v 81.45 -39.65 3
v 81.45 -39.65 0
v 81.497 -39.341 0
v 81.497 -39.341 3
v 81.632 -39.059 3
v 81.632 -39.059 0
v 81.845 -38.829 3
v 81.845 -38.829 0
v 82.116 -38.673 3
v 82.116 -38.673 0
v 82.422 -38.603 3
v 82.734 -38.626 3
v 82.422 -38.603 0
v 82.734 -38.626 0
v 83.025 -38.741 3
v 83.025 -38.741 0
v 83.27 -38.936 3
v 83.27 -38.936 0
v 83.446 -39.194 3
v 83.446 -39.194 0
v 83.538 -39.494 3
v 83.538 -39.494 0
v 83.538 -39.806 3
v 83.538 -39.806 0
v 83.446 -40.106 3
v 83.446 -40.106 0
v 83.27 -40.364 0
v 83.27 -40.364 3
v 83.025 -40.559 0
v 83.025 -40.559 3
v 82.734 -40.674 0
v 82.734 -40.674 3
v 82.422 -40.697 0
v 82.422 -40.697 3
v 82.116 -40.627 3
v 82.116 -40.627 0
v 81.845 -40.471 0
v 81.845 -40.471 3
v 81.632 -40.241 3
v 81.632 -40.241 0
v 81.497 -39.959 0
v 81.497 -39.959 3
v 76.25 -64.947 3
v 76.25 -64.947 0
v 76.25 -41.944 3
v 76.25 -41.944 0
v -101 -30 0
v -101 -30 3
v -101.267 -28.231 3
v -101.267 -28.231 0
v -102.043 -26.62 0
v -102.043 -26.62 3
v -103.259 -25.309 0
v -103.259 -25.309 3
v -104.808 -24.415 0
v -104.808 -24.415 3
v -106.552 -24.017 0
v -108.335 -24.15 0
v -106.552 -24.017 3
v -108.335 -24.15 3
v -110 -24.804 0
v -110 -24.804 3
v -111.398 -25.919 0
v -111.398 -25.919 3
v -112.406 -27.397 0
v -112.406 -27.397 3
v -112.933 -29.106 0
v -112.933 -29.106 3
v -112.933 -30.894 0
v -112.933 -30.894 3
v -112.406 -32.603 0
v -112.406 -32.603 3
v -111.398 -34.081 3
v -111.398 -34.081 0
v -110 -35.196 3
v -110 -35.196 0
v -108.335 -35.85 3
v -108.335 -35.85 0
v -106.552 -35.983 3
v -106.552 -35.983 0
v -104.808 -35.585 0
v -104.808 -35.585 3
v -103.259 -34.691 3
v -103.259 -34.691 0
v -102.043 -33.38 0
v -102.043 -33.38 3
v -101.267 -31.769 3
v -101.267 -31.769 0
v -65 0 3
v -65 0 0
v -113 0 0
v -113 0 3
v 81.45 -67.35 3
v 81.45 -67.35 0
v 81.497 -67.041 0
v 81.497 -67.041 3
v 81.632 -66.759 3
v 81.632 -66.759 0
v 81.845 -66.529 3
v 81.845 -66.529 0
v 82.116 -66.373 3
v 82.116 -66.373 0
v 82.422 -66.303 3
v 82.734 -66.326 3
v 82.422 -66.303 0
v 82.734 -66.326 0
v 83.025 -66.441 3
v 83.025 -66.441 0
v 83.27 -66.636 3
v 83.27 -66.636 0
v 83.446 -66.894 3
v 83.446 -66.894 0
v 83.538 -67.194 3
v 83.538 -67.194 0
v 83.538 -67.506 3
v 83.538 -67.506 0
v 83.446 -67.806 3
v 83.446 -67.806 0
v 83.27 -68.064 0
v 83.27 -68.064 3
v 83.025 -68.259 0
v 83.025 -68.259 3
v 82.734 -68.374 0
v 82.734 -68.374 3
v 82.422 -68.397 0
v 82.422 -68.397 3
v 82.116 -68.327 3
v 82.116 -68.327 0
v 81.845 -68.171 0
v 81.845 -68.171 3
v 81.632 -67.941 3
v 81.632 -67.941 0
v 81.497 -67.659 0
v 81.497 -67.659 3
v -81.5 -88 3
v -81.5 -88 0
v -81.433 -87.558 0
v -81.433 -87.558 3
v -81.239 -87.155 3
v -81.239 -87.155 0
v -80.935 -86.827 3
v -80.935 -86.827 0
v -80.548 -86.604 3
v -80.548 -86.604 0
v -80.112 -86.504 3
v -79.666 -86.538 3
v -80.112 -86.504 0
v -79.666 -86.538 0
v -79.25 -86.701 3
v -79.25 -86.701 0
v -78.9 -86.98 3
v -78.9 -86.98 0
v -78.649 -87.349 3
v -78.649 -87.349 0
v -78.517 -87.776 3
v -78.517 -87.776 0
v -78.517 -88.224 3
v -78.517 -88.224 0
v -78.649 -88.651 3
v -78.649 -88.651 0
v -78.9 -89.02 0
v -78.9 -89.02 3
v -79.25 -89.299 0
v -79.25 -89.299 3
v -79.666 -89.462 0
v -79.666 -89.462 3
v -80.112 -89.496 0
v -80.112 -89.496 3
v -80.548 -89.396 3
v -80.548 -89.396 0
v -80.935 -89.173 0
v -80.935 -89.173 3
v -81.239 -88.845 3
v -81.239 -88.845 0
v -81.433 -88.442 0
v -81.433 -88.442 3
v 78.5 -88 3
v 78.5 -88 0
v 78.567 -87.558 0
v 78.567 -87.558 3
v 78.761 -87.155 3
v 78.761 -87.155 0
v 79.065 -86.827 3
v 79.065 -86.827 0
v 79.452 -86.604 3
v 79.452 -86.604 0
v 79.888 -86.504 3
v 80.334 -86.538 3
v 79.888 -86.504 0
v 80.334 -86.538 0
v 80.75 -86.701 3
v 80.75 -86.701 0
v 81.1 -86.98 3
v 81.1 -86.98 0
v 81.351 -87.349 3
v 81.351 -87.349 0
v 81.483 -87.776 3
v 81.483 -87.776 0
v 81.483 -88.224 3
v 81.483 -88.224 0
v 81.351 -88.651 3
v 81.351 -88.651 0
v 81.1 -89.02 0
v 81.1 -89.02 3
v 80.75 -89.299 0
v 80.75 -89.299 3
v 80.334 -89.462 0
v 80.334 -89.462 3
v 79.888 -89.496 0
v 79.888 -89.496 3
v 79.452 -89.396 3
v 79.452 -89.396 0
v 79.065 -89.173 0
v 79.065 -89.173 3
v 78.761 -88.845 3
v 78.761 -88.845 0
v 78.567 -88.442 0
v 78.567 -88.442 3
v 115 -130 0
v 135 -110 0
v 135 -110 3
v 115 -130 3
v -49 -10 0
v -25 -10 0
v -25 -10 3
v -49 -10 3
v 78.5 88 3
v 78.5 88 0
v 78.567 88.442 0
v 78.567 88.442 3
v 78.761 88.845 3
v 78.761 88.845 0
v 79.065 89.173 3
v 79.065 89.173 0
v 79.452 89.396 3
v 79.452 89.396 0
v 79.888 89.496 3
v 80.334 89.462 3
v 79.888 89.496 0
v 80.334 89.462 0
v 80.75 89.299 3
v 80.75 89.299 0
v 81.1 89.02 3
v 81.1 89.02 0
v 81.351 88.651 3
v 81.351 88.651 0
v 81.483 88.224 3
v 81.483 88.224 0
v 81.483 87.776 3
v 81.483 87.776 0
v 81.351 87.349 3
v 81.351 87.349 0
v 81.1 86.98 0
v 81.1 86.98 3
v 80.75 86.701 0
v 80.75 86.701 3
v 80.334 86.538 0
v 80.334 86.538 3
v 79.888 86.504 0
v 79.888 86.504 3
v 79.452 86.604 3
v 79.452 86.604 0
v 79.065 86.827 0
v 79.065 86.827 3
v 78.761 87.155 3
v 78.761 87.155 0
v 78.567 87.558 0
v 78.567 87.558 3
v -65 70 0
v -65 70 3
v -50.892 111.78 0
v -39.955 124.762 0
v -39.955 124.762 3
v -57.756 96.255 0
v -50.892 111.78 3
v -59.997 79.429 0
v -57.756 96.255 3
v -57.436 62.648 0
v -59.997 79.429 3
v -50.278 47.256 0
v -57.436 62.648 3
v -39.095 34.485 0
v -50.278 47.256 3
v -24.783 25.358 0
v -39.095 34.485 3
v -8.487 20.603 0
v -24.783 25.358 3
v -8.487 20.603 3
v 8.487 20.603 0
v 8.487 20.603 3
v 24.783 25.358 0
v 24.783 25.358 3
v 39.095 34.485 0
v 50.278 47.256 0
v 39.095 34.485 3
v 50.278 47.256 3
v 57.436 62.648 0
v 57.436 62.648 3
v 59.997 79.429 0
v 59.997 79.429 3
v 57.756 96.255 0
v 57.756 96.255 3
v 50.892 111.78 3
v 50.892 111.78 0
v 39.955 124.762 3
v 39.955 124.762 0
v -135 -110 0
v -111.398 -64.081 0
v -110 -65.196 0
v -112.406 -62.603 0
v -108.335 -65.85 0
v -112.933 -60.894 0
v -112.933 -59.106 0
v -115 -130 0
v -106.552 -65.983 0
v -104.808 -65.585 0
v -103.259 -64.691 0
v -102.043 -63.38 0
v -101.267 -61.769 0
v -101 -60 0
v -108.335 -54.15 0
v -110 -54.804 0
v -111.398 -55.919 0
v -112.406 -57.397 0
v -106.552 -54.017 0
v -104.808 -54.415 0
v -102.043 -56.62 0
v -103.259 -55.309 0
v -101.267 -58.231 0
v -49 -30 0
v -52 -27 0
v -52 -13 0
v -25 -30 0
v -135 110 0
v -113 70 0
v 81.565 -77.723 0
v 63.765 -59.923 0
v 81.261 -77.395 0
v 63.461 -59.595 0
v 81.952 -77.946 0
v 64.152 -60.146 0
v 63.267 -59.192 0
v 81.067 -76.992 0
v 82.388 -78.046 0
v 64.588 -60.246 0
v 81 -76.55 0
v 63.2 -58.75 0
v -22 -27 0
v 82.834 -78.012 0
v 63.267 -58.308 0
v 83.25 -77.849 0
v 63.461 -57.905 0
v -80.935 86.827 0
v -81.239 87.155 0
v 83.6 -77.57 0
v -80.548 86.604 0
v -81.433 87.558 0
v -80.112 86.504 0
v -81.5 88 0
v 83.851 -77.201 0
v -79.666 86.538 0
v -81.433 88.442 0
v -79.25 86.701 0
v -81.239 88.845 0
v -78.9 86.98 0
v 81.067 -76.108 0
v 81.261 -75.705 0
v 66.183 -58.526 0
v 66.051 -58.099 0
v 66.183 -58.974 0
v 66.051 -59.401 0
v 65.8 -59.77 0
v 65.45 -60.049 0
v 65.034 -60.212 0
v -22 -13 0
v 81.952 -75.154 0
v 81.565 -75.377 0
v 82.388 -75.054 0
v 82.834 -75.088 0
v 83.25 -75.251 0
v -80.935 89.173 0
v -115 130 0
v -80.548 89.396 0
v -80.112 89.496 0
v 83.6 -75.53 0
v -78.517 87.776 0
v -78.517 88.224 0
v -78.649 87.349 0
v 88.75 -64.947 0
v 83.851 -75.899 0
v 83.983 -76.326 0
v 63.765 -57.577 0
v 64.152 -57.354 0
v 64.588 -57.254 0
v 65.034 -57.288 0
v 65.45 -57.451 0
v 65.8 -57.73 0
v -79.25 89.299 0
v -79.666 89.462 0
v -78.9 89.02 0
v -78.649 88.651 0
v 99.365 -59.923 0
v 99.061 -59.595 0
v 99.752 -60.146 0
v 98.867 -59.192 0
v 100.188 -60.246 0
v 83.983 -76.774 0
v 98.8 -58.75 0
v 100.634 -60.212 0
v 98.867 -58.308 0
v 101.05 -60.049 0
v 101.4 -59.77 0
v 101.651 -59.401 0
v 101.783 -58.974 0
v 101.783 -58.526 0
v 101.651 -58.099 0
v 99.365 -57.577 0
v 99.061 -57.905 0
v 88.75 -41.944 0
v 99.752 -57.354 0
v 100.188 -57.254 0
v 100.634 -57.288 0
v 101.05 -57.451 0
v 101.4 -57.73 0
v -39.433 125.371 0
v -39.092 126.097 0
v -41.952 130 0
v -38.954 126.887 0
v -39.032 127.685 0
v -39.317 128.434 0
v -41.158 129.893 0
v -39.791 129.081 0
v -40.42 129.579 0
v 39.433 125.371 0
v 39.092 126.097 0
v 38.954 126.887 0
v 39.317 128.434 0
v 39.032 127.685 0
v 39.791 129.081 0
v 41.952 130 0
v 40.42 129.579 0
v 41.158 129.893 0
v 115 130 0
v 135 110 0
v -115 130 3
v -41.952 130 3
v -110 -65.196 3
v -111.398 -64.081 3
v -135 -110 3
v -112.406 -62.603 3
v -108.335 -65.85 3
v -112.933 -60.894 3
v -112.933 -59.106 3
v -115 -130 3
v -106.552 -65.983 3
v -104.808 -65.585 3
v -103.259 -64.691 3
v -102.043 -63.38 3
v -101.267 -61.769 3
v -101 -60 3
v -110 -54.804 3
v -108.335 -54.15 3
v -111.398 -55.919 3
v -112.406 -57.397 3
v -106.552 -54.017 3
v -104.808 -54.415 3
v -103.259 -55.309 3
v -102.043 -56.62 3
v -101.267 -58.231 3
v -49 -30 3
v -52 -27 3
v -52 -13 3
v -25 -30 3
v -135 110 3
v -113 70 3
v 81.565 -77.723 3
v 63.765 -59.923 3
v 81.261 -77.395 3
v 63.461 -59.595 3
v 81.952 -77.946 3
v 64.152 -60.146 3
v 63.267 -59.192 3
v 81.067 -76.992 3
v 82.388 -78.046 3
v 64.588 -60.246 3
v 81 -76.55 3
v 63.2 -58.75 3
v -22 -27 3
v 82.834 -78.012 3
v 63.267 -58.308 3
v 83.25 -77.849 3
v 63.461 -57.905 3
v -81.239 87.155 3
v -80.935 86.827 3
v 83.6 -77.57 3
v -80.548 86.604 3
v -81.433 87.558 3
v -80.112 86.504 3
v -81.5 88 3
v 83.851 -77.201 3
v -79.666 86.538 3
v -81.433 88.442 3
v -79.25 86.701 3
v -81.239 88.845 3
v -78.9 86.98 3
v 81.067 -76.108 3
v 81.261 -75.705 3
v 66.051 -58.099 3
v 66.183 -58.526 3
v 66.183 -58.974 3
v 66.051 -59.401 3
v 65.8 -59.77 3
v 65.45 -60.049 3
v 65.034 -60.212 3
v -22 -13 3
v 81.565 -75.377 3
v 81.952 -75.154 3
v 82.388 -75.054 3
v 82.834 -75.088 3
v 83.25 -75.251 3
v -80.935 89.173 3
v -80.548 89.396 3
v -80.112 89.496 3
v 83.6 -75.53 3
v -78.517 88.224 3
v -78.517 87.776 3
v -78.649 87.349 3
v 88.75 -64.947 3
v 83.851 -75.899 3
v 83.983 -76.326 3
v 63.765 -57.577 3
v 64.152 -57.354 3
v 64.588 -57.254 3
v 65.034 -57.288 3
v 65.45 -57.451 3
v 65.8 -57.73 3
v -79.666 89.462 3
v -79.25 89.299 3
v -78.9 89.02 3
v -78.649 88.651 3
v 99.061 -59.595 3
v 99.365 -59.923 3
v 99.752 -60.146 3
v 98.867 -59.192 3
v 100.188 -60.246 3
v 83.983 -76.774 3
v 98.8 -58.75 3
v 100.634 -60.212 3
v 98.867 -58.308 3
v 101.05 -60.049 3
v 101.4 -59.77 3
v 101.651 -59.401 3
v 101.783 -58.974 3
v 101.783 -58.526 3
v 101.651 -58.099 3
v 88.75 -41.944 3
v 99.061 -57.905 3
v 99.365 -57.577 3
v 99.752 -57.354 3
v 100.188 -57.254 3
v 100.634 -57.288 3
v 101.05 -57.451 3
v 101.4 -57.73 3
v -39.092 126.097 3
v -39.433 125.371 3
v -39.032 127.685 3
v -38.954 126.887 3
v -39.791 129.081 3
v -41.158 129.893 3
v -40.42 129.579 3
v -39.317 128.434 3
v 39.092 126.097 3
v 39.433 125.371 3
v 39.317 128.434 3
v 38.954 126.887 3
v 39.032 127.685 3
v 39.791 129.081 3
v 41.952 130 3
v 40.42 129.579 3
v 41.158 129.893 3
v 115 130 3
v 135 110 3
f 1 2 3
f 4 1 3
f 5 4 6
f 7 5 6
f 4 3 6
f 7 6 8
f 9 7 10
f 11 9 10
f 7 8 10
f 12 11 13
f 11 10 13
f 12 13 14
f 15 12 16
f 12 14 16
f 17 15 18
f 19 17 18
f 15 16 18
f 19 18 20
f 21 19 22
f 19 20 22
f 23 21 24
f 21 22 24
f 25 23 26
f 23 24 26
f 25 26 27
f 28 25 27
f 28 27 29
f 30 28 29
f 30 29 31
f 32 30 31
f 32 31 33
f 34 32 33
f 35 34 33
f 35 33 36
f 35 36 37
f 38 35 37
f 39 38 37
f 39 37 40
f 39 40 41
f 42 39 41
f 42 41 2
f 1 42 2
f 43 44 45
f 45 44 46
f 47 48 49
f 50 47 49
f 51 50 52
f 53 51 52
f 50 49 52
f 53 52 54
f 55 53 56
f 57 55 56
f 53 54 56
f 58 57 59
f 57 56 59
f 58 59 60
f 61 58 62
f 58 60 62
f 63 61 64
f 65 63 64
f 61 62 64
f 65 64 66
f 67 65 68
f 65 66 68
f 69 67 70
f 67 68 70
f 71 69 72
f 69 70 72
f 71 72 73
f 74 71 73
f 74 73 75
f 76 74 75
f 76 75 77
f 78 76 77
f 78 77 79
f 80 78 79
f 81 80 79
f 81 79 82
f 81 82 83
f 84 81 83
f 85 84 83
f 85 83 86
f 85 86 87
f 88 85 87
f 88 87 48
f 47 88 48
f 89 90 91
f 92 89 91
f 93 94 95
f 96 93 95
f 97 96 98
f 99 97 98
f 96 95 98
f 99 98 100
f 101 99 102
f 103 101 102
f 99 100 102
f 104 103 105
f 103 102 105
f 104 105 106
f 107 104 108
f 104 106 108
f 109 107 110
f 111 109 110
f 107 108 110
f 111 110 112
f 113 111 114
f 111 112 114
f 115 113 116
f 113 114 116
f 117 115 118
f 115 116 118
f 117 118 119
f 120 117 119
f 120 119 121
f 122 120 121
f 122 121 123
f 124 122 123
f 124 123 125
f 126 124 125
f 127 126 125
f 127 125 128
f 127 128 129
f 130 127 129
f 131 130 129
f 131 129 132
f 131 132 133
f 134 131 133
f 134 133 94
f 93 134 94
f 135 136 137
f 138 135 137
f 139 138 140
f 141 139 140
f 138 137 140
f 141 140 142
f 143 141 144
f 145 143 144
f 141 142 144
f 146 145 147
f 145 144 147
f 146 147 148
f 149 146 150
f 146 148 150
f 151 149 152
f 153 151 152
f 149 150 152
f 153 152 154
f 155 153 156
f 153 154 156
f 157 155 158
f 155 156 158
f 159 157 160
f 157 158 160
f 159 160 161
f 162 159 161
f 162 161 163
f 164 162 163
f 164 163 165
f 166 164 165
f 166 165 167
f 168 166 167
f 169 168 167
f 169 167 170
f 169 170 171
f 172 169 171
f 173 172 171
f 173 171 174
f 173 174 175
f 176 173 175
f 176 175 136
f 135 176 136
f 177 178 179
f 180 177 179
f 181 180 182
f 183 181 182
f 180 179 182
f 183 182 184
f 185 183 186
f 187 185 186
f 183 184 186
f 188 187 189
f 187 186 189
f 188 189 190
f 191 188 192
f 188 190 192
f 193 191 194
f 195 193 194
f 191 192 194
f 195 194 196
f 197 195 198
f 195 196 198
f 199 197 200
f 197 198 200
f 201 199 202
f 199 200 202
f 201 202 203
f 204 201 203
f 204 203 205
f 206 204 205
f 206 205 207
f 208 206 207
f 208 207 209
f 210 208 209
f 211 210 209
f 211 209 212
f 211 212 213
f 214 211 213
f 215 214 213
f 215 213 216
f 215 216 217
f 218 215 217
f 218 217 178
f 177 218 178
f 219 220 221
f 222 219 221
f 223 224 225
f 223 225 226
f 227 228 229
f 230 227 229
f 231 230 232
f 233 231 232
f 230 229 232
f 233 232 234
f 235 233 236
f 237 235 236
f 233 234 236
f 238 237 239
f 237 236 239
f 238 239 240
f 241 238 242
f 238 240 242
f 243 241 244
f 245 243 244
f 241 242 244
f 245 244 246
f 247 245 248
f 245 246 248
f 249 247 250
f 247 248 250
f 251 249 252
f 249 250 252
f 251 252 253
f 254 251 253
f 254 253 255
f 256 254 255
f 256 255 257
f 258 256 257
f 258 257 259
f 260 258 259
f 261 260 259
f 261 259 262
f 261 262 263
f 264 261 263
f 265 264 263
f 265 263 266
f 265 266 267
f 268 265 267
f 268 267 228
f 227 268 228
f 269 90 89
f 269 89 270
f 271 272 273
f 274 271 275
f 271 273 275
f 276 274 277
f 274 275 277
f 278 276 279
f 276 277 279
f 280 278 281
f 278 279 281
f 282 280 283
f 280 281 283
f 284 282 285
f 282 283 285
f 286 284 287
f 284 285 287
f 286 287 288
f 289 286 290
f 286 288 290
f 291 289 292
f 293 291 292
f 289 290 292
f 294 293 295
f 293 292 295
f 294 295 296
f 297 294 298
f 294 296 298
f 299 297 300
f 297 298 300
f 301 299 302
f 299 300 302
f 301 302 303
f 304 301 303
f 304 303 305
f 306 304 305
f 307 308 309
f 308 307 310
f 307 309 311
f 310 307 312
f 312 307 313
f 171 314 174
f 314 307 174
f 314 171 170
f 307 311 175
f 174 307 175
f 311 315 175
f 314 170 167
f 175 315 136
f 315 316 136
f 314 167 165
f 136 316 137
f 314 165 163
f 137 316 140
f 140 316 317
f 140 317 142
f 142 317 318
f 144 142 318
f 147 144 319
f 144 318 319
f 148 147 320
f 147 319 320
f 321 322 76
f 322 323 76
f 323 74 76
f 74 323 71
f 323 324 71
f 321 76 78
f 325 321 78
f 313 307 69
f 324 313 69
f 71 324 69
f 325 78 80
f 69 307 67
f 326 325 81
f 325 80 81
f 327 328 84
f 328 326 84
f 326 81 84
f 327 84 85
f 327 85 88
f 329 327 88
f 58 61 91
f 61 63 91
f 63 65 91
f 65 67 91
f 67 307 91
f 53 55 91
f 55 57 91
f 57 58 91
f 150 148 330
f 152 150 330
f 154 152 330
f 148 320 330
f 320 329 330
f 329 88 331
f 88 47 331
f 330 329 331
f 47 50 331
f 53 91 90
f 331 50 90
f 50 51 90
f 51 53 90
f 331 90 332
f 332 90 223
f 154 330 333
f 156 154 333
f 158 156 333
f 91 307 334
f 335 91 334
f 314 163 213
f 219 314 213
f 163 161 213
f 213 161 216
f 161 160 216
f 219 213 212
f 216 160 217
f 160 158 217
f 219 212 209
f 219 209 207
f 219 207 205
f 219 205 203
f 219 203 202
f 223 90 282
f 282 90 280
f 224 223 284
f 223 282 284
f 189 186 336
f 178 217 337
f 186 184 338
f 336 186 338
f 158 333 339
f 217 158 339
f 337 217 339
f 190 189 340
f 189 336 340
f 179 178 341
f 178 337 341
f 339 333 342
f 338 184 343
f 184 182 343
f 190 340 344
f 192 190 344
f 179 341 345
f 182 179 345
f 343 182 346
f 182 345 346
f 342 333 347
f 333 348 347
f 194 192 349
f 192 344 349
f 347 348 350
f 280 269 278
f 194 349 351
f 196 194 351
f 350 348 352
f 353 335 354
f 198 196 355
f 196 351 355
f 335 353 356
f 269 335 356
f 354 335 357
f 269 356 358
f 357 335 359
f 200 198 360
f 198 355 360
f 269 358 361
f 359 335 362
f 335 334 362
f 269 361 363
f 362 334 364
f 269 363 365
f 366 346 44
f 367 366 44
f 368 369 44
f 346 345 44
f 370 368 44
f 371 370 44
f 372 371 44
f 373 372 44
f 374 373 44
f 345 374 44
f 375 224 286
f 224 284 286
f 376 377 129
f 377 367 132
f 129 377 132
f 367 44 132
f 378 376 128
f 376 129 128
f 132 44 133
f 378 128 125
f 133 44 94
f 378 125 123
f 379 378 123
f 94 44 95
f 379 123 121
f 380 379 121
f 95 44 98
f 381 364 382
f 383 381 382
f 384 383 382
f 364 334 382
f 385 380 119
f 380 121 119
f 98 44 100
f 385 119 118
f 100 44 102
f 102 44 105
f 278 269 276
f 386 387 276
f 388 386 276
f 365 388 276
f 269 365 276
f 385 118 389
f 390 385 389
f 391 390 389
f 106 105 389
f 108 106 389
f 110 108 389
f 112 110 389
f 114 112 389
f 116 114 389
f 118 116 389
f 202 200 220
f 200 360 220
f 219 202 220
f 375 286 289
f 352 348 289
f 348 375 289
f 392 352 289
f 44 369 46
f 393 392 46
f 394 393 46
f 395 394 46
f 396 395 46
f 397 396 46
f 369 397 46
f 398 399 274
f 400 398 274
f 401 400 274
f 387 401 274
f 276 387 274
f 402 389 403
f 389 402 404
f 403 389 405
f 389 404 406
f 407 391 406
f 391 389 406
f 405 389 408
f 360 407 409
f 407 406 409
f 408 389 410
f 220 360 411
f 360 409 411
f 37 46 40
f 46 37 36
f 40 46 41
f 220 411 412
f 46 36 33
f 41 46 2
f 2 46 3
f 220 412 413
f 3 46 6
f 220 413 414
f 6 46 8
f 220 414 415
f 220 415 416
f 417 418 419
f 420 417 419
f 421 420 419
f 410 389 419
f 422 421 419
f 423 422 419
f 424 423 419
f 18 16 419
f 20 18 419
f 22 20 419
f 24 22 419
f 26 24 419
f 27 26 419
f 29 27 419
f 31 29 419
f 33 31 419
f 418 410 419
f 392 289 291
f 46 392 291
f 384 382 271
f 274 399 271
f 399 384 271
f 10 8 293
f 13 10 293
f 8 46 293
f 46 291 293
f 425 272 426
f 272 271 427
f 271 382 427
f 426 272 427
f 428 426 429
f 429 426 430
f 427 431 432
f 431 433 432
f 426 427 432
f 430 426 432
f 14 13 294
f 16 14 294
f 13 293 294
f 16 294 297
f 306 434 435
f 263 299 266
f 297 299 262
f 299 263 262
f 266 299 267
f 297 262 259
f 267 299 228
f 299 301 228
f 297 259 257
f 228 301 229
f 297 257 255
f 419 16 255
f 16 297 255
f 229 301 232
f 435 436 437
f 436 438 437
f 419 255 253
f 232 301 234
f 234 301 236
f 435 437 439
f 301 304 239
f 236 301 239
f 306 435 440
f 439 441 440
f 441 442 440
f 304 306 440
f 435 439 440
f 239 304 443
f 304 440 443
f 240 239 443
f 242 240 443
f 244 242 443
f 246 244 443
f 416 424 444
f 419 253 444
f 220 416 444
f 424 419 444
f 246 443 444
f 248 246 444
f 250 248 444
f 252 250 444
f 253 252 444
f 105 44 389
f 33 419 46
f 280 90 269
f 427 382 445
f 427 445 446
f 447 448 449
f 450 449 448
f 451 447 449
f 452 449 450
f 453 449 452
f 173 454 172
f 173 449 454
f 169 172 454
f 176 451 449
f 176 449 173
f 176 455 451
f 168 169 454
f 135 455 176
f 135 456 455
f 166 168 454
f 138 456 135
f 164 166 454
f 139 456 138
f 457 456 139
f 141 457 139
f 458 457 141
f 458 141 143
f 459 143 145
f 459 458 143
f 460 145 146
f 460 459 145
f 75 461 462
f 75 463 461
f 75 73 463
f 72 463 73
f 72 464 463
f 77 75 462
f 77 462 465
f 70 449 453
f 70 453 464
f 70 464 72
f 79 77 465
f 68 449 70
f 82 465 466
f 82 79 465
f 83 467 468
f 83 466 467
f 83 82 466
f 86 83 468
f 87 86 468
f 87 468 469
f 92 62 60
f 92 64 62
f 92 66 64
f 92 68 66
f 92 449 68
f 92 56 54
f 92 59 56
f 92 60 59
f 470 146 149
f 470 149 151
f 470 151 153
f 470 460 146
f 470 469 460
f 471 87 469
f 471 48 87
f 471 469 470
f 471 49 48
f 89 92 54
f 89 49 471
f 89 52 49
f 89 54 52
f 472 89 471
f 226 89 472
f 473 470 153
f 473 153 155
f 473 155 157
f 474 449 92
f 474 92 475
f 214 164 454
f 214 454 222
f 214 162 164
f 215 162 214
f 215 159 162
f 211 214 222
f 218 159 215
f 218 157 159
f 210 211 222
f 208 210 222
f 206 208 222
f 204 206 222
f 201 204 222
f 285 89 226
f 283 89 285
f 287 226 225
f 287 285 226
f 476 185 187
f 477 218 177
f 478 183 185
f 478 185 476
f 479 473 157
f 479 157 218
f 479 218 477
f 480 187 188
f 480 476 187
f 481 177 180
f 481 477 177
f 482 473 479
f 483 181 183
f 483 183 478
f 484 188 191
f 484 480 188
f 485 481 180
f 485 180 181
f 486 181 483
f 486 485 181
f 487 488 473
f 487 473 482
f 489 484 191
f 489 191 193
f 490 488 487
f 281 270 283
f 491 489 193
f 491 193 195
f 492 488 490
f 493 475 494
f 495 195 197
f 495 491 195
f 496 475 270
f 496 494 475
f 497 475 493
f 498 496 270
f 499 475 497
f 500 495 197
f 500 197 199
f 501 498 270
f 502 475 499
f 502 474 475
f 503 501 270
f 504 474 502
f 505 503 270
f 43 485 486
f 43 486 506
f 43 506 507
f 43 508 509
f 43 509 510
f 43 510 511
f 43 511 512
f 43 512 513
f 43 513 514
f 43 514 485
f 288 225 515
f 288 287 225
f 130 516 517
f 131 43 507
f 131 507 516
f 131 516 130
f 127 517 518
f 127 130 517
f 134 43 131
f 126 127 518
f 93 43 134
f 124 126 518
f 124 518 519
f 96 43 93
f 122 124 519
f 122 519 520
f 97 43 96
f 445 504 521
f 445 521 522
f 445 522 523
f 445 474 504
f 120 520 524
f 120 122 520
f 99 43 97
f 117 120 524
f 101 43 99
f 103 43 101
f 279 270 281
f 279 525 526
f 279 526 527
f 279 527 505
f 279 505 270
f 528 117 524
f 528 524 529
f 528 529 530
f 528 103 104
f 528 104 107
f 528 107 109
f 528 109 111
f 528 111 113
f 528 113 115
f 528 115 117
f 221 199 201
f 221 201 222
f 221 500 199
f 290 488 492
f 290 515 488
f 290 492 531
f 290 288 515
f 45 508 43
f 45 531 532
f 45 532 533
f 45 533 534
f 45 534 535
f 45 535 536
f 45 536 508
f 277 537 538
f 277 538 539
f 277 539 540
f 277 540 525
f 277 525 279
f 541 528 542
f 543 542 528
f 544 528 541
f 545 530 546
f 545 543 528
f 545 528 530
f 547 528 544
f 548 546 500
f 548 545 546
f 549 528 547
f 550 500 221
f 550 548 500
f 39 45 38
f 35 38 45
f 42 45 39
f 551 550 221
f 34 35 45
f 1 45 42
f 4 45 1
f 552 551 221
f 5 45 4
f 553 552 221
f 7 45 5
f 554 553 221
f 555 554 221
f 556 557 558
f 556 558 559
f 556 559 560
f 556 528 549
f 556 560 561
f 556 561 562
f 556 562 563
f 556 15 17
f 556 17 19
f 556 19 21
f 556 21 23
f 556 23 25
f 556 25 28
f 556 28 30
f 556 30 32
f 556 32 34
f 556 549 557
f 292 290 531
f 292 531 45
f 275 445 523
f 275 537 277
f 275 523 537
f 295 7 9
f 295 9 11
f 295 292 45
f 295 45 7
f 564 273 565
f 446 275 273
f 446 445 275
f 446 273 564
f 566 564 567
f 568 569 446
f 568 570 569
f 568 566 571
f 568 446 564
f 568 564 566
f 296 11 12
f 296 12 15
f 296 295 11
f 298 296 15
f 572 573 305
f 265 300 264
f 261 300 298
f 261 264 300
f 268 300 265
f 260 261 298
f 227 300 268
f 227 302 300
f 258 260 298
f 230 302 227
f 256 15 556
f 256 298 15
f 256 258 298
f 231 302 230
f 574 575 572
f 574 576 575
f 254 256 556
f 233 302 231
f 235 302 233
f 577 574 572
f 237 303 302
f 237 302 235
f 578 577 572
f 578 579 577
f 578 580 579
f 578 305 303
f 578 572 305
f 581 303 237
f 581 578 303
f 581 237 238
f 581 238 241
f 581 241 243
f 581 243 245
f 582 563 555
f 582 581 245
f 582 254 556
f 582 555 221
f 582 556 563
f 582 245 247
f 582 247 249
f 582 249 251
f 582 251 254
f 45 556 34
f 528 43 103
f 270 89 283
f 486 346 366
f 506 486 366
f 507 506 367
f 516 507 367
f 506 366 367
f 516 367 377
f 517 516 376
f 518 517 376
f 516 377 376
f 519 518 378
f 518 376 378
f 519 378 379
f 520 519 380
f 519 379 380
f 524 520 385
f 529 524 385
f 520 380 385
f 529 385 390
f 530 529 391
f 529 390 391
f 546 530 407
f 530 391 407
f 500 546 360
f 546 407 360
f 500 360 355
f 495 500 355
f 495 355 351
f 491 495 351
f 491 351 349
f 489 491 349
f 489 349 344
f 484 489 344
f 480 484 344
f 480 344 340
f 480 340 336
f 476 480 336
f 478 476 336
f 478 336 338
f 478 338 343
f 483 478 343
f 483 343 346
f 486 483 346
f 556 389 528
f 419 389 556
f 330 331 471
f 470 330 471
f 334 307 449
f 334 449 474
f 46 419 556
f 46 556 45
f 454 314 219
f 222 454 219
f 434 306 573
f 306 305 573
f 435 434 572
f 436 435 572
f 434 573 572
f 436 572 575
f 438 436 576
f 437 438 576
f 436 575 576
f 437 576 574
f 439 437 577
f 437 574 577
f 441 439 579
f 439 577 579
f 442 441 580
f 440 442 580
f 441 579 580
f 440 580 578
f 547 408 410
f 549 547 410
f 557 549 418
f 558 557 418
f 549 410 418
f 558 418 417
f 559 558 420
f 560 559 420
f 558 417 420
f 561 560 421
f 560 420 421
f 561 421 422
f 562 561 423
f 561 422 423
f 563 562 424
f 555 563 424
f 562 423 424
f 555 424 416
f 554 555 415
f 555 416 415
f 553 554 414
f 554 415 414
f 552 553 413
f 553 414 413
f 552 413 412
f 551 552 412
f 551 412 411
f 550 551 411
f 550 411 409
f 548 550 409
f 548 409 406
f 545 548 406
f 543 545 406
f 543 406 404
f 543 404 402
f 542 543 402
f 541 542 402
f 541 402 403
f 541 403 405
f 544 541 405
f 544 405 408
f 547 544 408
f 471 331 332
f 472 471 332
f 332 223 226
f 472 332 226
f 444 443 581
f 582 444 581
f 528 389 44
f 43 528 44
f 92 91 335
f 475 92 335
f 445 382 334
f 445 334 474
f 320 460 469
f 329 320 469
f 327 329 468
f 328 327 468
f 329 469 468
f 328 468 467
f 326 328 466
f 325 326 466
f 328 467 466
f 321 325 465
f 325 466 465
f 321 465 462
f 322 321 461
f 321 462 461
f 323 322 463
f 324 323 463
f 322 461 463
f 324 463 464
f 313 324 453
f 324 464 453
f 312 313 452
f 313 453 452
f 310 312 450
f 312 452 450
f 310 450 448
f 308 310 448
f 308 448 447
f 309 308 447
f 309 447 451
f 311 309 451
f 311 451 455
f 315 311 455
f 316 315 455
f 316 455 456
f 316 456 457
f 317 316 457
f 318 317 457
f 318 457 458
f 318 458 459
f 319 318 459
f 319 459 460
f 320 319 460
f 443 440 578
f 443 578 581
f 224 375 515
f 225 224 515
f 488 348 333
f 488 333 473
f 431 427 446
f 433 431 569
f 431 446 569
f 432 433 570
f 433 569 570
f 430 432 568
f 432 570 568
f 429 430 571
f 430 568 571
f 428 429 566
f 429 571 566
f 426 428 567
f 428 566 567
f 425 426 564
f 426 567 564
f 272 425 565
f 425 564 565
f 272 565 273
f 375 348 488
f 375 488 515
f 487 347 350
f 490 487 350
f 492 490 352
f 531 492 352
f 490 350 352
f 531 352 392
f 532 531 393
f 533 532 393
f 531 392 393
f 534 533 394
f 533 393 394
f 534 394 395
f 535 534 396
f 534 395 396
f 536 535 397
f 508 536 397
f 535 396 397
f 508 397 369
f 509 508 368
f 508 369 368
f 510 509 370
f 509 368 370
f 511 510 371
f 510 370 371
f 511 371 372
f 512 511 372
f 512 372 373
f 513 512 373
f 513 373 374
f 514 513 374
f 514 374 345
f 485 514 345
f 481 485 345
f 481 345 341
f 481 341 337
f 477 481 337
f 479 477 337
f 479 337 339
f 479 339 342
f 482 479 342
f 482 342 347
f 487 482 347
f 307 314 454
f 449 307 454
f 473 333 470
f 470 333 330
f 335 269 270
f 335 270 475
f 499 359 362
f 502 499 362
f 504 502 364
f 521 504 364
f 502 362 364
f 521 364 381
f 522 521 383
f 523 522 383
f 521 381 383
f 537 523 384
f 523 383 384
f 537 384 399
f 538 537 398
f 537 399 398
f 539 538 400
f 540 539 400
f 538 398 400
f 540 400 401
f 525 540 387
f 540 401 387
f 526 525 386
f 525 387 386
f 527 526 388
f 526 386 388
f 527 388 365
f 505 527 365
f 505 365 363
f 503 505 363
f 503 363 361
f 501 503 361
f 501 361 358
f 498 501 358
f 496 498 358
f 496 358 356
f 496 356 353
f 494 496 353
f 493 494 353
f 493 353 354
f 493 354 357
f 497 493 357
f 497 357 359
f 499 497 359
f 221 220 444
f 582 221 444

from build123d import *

# Parameters (mm, degrees)
SKETCH_1_W          = 270
SKETCH_1_H          = 260
EXTRUDE_1_DEPTH     = 3
CHAMFER_2_SIZE      = 20
SKETCH_4_R          = 60
CUT_EXTRUDE_1_DEPTH = 10
FILLET_1_R          = 3
SKETCH_5_R          = 1.5
SKETCH_5_R_2        = 1.05
SKETCH_5_W          = 12.5
SKETCH_5_H          = 23.002638066
CUT_EXTRUDE_2_DEPTH = 10
SKETCH_6_W          = 48
SKETCH_6_H          = 70
CUT_EXTRUDE_3_DEPTH = 0.1
SKETCH_10_W         = 48
SKETCH_10_H         = 70
CUT_EXTRUDE_4_DEPTH = 188.440657276
SKETCH_11_R         = 6
CUT_EXTRUDE_5_DEPTH = 188.440657276
SKETCH_13_R         = 1.5
CUT_EXTRUDE_6_DEPTH = 188.440657276
SKETCH_15_W         = 30
SKETCH_15_H         = 20
CUT_EXTRUDE_8_DEPTH = 188.440657276
CHAMFER_4_SIZE      = 3


with BuildPart() as part:
    # 草图1 → 凸台-拉伸1 (new body)
    with BuildSketch(Plane.XY):
        Rectangle(SKETCH_1_W, SKETCH_1_H)
    extrude(amount=EXTRUDE_1_DEPTH)

    # 倒角2
    chamfer_2_edges = [part.edges().sort_by_distance(p)[0] for p in [
        (135, -130, 1.5),
        (-135, -130, 1.5),
        (-135, 130, 1.5),
        (135, 130, 1.5),
    ]]
    chamfer(chamfer_2_edges, length=CHAMFER_2_SIZE)

    # 草图4 → 切除-拉伸1 (cut)
    with BuildSketch(Plane.XY.offset(3)):
        with Locations((0, 80)):
            Circle(SKETCH_4_R)
    extrude(amount=-CUT_EXTRUDE_1_DEPTH, mode=Mode.SUBTRACT)

    # 圆角1
    fillet_1_edges = [part.edges().sort_by_distance(p)[0] for p in [
        (33.166247904, 130, 1.5),
        (-33.166247904, 130, 1.5),
    ]]
    fillet(fillet_1_edges, radius=FILLET_1_R)

    # 草图5 → 切除-拉伸2 (cut)
    with BuildSketch(Plane(origin=(0, 0, 0), x_dir=(-1, 0, 0), z_dir=(0, 0, -1))):
        with Locations((-64.7, -58.75)):
            Circle(SKETCH_5_R)
        with Locations((-100.3, -58.75)):
            Circle(SKETCH_5_R)
        with Locations((-82.5, -76.55)):
            Circle(SKETCH_5_R)
        with Locations((-82.5, -39.65)):
            Circle(SKETCH_5_R_2)
        with Locations((-82.5, -67.35)):
            Circle(SKETCH_5_R_2)
        with Locations((-82.5, -53.445792921)):
            Rectangle(SKETCH_5_W, SKETCH_5_H)
    extrude(amount=-CUT_EXTRUDE_2_DEPTH, mode=Mode.SUBTRACT)

    # 草图6 → 切除-拉伸3 (cut)
    with BuildSketch(Plane(origin=(0, 0, 0), x_dir=(-1, 0, 0), z_dir=(0, 0, -1))):
        with Locations((89, 35)):
            Rectangle(SKETCH_6_W, SKETCH_6_H)
    extrude(amount=-CUT_EXTRUDE_3_DEPTH, mode=Mode.SUBTRACT)

    # 草图10 → 切除-拉伸4 (cut, through all)
    with BuildSketch(Plane(origin=(0, 0, 0), x_dir=(-1, 0, 0), z_dir=(0, 0, -1))):
        with Locations((89, 35)):
            Rectangle(SKETCH_10_W, SKETCH_10_H)
    extrude(amount=-CUT_EXTRUDE_4_DEPTH, mode=Mode.SUBTRACT)

    # 草图11 → 切除-拉伸5 (cut, through all)
    with BuildSketch(Plane.XY.offset(3)):
        with Locations((-107, -30)):
            Circle(SKETCH_11_R)
        with Locations((-107, -60)):
            Circle(SKETCH_11_R)
    extrude(amount=-CUT_EXTRUDE_5_DEPTH, mode=Mode.SUBTRACT)

    # 草图13 → 切除-拉伸6 (cut, through all)
    with BuildSketch(Plane(origin=(0, 0, 0), x_dir=(-1, 0, 0), z_dir=(0, 0, -1))):
        with Locations((80, 88)):
            Circle(SKETCH_13_R)
        with Locations((80, -88)):
            Circle(SKETCH_13_R)
        with Locations((-80, -88)):
            Circle(SKETCH_13_R)
        with Locations((-80, 88)):
            Circle(SKETCH_13_R)
    extrude(amount=-CUT_EXTRUDE_6_DEPTH, mode=Mode.SUBTRACT)

    # 草图15 → 切除-拉伸8 (cut, through all)
    with BuildSketch(Plane(origin=(0, 0, 0), x_dir=(-1, 0, 0), z_dir=(0, 0, -1))):
        with Locations((37, -20)):
            Rectangle(SKETCH_15_W, SKETCH_15_H)
    extrude(amount=-CUT_EXTRUDE_8_DEPTH, mode=Mode.SUBTRACT)

    # 倒角4
    chamfer_4_edges = [part.edges().sort_by_distance(p)[0] for p in [
        (-22, -30, 1.5),
        (-22, -10, 1.5),
        (-52, -10, 1.5),
        (-52, -30, 1.5),
    ]]
    chamfer(chamfer_4_edges, length=CHAMFER_4_SIZE)


solid = part.part
